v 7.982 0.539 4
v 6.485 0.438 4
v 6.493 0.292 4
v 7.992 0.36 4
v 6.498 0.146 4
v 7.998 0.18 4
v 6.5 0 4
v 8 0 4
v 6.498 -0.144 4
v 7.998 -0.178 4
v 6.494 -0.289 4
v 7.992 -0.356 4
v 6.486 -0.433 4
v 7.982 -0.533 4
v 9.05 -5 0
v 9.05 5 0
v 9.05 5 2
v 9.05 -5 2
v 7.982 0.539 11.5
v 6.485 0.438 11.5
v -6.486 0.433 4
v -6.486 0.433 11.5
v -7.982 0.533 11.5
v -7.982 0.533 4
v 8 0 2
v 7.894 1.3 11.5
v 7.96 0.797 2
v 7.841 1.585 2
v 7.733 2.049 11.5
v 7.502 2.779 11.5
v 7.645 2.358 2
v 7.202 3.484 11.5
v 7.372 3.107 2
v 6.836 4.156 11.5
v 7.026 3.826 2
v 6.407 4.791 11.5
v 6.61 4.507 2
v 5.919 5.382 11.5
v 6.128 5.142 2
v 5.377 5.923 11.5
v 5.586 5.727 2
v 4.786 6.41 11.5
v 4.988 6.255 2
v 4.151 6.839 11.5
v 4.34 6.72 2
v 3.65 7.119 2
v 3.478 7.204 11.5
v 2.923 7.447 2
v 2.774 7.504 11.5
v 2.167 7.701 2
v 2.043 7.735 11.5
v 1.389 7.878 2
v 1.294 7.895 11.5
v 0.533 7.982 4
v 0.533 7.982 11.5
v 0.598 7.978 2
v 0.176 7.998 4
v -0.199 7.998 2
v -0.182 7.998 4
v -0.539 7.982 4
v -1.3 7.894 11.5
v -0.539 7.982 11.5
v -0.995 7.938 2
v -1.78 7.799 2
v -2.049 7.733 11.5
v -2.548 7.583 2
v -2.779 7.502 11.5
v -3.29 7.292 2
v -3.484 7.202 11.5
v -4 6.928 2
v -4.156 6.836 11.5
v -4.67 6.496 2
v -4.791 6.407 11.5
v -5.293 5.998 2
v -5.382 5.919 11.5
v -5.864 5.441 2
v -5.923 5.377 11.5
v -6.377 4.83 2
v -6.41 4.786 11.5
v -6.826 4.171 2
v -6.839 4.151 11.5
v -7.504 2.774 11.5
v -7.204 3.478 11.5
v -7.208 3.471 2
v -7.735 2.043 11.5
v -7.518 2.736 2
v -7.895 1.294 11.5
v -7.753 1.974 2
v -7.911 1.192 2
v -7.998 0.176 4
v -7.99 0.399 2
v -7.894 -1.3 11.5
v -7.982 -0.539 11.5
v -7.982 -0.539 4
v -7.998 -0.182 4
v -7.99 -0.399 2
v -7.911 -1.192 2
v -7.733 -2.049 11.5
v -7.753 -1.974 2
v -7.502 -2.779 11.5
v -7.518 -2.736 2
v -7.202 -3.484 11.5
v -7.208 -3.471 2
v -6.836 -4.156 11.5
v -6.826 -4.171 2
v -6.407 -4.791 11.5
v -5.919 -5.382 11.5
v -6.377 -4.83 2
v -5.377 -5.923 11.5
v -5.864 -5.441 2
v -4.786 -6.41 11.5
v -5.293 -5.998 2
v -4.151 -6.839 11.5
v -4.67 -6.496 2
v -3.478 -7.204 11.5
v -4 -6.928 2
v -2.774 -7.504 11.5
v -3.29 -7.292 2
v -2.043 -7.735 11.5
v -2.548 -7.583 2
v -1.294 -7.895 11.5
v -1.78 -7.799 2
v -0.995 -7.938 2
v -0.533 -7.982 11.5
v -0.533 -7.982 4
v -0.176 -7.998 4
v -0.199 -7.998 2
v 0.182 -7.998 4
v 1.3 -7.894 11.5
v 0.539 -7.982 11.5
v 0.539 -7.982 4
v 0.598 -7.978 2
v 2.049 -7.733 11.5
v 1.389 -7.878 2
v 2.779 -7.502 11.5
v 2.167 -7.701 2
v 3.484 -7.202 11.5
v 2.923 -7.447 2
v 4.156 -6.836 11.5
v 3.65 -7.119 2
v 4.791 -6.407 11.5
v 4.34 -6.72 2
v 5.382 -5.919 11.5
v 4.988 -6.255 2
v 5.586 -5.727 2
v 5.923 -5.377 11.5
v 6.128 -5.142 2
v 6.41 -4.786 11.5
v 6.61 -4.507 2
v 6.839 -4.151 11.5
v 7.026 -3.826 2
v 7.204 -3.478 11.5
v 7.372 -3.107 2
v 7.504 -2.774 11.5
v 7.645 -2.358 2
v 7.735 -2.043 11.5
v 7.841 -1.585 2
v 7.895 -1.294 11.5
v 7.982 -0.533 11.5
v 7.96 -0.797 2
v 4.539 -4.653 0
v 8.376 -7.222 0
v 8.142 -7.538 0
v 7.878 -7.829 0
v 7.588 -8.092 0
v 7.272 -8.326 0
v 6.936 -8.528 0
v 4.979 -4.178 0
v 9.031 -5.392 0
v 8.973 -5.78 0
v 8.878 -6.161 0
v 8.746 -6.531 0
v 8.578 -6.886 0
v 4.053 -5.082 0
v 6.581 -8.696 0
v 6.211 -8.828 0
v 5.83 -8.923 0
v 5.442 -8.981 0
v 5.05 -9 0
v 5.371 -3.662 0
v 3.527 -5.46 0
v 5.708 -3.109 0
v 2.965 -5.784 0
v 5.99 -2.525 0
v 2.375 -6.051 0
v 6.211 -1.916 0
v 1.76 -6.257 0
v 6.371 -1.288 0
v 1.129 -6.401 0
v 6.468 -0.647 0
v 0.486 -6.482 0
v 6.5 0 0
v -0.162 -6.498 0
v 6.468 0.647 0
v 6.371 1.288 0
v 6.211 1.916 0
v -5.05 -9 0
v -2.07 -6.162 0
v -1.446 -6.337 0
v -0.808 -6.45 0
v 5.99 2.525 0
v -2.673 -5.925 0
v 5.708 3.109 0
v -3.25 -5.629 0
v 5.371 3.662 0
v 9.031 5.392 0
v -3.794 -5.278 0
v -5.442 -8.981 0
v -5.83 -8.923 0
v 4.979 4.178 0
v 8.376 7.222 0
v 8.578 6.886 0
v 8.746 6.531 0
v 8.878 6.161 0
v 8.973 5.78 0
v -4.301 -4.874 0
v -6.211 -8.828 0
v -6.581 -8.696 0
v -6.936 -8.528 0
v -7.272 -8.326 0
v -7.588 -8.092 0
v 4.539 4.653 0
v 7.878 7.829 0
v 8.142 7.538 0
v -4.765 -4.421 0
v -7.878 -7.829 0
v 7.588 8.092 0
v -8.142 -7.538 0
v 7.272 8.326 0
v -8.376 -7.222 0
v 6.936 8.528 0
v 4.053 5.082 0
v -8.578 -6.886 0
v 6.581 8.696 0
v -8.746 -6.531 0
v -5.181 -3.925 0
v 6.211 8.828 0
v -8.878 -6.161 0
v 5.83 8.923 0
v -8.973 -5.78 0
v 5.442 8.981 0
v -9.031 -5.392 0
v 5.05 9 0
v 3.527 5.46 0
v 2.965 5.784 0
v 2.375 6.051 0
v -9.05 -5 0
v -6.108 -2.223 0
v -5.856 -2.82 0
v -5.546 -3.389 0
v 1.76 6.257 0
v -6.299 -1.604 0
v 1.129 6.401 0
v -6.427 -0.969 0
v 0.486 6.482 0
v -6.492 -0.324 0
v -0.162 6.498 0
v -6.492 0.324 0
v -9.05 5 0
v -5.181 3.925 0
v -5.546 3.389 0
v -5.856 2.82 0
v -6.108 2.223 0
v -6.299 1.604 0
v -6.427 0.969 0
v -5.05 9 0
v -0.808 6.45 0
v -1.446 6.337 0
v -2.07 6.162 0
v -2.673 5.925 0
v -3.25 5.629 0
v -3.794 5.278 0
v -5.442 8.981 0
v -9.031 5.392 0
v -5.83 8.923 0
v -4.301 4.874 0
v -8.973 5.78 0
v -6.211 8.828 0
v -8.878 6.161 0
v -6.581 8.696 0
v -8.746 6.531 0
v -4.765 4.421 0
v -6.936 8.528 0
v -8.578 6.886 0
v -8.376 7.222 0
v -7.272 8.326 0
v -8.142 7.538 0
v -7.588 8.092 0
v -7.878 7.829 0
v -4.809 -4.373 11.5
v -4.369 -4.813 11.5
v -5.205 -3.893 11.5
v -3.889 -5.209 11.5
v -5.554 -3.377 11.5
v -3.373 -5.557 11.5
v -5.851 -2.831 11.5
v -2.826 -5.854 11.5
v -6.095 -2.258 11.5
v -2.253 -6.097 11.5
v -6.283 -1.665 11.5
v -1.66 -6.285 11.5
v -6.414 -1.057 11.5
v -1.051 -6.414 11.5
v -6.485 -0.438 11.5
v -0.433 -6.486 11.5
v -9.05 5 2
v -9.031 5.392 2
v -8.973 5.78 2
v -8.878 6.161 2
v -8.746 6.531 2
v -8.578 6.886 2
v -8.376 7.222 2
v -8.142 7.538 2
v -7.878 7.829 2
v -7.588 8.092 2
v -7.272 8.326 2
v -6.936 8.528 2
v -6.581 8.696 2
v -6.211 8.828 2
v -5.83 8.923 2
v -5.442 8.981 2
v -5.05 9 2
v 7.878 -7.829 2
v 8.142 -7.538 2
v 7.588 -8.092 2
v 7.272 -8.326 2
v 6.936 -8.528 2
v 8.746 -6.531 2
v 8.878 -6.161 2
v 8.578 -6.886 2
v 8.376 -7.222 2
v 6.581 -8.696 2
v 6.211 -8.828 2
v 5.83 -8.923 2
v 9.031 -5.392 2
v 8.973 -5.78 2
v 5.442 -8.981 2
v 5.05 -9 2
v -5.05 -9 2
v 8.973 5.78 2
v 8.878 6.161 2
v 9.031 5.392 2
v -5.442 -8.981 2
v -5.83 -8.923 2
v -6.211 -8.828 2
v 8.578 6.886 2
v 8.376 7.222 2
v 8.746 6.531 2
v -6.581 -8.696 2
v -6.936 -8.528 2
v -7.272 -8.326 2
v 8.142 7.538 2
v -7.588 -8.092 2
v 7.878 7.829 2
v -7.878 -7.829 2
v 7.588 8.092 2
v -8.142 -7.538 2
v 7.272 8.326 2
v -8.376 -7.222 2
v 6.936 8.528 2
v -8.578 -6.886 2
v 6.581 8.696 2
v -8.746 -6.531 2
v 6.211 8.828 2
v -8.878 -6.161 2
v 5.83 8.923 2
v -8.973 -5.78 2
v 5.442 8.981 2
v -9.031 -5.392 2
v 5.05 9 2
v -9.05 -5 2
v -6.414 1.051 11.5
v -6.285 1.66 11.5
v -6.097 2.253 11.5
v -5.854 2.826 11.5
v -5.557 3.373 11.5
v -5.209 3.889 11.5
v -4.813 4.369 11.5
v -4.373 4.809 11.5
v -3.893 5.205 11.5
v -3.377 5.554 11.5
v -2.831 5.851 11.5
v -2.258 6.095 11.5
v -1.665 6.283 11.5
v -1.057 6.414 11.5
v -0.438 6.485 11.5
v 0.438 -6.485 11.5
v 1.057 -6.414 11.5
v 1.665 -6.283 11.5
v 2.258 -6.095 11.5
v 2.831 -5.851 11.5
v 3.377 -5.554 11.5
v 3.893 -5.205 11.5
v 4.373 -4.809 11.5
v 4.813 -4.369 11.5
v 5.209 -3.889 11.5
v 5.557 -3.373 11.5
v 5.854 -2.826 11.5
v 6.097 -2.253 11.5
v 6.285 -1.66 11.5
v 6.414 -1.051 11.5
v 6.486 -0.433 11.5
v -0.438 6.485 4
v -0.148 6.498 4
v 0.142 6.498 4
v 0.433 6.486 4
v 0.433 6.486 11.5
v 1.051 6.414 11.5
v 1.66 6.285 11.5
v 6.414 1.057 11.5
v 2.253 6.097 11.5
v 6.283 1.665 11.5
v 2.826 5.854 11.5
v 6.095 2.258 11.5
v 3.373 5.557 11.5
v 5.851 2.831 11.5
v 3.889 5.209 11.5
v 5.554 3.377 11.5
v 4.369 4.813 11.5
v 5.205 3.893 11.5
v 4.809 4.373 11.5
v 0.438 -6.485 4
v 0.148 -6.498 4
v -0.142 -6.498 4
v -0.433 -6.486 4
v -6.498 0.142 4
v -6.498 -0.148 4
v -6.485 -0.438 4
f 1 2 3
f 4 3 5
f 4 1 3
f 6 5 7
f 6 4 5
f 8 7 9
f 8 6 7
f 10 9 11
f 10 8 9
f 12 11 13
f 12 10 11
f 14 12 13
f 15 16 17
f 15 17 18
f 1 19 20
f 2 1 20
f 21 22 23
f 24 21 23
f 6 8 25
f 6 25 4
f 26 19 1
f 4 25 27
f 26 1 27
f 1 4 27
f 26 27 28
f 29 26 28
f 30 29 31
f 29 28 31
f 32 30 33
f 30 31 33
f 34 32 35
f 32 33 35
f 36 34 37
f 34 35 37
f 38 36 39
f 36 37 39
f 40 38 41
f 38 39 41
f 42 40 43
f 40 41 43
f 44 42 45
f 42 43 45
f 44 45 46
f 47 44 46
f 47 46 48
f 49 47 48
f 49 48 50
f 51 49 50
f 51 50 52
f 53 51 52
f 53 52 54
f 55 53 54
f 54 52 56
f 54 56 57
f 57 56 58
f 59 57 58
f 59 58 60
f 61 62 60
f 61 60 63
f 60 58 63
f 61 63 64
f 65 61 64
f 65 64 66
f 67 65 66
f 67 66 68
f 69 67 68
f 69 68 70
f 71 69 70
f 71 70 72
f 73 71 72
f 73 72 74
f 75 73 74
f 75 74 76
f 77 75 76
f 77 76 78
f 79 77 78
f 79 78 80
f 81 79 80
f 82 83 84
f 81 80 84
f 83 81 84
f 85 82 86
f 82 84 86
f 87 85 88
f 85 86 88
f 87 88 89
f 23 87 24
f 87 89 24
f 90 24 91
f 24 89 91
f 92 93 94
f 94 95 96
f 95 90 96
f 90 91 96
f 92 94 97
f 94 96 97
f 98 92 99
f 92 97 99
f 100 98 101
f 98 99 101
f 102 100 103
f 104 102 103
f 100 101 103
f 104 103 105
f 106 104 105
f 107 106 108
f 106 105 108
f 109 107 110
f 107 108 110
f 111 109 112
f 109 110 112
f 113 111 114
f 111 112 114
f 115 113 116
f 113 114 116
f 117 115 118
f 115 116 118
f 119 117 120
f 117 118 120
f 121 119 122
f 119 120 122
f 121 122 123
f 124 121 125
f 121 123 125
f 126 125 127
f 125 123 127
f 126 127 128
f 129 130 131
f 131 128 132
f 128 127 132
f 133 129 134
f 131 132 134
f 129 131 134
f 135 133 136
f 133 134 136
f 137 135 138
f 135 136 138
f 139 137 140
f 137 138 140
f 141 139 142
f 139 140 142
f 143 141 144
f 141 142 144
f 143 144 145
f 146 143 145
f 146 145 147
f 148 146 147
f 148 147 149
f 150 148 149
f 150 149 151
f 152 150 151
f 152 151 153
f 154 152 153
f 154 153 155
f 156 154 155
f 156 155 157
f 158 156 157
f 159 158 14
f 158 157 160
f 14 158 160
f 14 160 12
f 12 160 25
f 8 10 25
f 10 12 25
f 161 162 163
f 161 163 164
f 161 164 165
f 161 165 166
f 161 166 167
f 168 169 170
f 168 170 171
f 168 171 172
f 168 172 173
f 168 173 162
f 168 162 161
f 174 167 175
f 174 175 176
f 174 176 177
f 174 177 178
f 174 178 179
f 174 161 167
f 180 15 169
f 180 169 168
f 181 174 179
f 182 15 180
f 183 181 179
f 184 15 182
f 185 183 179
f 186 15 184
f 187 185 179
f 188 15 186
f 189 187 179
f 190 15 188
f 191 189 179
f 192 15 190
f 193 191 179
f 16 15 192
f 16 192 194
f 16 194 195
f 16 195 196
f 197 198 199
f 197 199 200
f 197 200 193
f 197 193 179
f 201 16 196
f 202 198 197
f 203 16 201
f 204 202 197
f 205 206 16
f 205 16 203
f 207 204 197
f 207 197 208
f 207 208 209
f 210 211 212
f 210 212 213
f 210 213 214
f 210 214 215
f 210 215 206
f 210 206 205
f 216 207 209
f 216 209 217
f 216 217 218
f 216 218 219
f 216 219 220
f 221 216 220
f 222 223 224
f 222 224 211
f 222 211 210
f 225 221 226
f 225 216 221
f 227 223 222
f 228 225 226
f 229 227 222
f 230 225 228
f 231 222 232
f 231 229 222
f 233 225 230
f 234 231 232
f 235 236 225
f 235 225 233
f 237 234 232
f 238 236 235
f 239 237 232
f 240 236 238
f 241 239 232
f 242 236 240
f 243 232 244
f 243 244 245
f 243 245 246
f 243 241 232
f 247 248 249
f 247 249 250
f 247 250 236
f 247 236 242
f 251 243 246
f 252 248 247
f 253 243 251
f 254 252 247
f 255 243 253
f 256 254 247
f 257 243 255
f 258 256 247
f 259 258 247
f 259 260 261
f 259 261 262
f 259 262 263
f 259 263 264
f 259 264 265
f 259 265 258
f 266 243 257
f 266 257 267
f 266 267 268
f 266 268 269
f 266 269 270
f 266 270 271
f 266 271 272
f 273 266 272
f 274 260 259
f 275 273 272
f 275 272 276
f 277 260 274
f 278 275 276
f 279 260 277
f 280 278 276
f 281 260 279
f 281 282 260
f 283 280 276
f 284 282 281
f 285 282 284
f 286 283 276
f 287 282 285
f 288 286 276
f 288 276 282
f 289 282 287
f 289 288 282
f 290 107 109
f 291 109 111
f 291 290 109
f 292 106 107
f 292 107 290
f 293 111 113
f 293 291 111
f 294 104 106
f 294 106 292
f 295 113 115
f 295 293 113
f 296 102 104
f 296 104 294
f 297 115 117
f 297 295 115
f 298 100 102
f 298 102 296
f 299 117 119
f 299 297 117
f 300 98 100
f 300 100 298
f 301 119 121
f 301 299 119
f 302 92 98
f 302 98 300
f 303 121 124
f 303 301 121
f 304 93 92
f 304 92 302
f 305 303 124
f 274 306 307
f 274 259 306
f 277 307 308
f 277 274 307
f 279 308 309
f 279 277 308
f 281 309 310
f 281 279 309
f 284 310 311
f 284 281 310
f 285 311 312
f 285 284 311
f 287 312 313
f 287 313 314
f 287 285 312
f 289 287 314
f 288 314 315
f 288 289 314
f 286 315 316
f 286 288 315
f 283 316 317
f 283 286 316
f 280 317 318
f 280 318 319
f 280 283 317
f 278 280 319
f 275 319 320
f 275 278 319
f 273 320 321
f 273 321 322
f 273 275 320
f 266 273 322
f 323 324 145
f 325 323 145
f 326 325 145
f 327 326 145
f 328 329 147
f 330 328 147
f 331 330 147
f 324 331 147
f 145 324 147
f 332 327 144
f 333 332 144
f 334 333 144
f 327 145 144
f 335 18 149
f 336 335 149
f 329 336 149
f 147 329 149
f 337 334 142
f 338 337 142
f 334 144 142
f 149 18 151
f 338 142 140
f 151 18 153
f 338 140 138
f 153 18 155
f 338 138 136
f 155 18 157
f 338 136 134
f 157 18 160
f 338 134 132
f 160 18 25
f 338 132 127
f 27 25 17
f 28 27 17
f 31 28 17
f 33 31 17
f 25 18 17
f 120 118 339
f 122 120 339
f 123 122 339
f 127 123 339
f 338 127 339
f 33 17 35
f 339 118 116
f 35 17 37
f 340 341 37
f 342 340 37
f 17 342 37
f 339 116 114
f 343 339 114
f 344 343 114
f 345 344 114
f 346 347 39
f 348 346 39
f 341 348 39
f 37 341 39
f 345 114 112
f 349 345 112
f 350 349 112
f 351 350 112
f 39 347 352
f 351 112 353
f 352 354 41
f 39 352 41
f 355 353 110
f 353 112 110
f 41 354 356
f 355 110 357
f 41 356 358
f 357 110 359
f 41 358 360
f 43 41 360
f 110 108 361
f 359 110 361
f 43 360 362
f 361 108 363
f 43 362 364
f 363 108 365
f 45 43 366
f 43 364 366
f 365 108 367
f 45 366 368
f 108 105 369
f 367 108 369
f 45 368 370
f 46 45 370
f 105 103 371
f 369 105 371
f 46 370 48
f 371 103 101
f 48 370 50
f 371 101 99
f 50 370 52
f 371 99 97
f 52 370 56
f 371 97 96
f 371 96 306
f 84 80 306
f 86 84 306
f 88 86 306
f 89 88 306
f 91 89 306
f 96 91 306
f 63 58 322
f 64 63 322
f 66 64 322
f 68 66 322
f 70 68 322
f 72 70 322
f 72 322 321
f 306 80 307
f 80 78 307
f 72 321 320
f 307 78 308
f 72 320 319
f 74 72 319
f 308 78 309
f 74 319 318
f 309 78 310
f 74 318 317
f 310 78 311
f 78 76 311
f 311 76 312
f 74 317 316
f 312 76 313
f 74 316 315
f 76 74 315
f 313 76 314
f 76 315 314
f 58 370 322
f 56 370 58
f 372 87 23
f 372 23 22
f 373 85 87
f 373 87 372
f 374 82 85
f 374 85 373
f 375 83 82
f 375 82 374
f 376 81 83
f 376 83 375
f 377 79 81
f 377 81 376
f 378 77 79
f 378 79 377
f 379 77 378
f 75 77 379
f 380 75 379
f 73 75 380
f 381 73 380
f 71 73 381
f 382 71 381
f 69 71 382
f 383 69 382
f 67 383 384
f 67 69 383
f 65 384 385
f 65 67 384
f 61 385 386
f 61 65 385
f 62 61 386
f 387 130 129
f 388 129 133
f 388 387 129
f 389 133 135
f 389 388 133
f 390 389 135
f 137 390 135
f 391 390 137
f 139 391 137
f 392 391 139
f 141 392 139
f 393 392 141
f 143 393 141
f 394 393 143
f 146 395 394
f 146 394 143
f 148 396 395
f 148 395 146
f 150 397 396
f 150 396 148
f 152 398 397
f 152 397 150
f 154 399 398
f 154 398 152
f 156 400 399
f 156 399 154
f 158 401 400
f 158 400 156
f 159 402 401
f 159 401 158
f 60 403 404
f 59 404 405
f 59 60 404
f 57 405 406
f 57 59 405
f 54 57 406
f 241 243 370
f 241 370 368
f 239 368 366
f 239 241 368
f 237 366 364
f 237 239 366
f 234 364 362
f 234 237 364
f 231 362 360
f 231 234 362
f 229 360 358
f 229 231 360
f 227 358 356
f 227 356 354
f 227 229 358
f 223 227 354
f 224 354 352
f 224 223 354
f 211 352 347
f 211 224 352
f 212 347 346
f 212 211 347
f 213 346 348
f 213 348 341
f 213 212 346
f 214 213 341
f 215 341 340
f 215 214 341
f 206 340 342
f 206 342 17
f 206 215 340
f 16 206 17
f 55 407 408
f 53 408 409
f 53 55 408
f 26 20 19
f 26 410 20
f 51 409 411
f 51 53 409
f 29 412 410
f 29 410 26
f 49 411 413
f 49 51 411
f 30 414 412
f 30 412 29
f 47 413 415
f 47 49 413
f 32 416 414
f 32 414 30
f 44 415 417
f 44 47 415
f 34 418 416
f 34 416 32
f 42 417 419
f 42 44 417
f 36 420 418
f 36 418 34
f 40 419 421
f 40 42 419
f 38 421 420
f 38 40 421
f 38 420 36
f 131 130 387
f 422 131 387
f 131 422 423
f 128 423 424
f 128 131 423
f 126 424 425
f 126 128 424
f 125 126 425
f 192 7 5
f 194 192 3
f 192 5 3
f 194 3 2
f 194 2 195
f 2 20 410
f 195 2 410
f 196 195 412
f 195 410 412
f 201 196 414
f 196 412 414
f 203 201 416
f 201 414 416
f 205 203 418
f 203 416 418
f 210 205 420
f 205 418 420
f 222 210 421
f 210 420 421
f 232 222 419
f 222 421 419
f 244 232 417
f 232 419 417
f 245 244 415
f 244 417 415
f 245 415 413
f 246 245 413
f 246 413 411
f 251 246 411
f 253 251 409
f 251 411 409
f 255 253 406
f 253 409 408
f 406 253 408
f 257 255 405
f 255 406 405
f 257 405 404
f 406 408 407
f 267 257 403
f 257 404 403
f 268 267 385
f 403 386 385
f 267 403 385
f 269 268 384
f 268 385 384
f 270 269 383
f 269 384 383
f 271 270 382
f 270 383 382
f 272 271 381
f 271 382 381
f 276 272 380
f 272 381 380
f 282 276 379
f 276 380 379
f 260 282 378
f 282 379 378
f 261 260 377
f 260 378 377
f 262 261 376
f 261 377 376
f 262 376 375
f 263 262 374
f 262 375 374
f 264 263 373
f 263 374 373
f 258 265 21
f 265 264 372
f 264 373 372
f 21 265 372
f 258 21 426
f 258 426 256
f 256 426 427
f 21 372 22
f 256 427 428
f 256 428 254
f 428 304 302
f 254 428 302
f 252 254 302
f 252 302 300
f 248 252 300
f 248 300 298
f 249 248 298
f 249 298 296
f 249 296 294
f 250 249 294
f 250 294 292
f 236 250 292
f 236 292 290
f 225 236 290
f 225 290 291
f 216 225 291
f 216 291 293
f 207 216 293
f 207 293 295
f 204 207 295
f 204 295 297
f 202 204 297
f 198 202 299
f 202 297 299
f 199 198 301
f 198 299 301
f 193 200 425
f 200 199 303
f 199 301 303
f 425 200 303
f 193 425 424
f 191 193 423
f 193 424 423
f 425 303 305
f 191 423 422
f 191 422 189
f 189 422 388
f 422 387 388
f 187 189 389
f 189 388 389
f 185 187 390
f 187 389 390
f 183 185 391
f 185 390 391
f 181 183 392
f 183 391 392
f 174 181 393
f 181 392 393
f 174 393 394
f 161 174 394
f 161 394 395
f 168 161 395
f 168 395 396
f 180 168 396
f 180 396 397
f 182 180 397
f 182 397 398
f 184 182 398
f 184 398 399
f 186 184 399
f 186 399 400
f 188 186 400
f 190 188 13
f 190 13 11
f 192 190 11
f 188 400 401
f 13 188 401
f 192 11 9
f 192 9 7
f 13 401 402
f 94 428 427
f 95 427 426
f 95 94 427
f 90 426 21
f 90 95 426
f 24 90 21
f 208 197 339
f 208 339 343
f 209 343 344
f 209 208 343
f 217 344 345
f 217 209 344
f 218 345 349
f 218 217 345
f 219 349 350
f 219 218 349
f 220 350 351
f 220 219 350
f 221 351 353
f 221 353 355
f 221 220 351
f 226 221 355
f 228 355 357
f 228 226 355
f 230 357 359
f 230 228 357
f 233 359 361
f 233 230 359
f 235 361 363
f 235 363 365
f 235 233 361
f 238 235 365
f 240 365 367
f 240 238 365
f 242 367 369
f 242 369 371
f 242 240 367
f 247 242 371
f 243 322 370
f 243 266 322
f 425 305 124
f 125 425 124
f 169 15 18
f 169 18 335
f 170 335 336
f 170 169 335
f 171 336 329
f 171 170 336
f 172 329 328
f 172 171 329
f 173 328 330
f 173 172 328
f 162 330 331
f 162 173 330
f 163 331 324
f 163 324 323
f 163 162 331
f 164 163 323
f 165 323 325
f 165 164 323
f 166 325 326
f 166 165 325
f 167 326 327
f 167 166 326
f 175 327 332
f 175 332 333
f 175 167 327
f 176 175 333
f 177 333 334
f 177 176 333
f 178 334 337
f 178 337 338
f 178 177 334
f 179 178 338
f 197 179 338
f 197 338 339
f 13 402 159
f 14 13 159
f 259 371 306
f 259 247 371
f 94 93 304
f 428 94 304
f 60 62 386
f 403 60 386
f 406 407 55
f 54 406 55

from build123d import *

# Parameters (mm, degrees)
BOSS_EXTRUDE1_DEPTH = 0.0001
BOSS_EXTRUDE2_DEPTH = 2
BOSS_EXTRUDE3_DEPTH = 0.0001
SKETCH4_R           = 8
BOSS_EXTRUDE4_DEPTH = 9.5
SKETCH5_R           = 6.5
CUT_EXTRUDE1_DEPTH  = 25
CUT_EXTRUDE4_DEPTH  = 7.5
CIRPATTERN2_COUNT   = 4


with BuildPart() as part:
    # Sketch1 → Boss-Extrude1 (new body)
    with BuildSketch(Plane.XY):
        with BuildLine():
            Line((-5.05, 9.000108401), (5.05, 9.000108401))
            ThreePointArc((5.05, 9.000108401), (7.878427125, 7.828535526), (9.05, 5.000108401))
            Line((9.05, 5.000108401), (9.05, -5.000108401))
            ThreePointArc((9.05, -5.000108401), (7.878427125, -7.828535526), (5.05, -9.000108401))
            Line((5.05, -9.000108401), (-5.05, -9.000108401))
            ThreePointArc((-5.05, -9.000108401), (-7.878427125, -7.828535526), (-9.05, -5.000108401))
            Line((-9.05, -5.000108401), (-9.05, 5.000108401))
            ThreePointArc((-9.05, 5.000108401), (-7.878427125, 7.828535526), (-5.05, 9.000108401))
        make_face()
    extrude(amount=BOSS_EXTRUDE1_DEPTH)

    # Sketch2 → Boss-Extrude2 (add)
    with BuildSketch(Plane.XY):
        with BuildLine():
            Line((-5.05, 9.000108401), (5.05, 9.000108401))
            ThreePointArc((5.05, 9.000108401), (7.878427125, 7.828535526), (9.05, 5.000108401))
            Line((9.05, 5.000108401), (9.05, -5.000108401))
            ThreePointArc((9.05, -5.000108401), (7.878427125, -7.828535526), (5.05, -9.000108401))
            Line((5.05, -9.000108401), (-5.05, -9.000108401))
            ThreePointArc((-5.05, -9.000108401), (-7.878427125, -7.828535526), (-9.05, -5.000108401))
            Line((-9.05, -5.000108401), (-9.05, 5.000108401))
            ThreePointArc((-9.05, 5.000108401), (-7.878427125, 7.828535526), (-5.05, 9.000108401))
        make_face()
    extrude(amount=BOSS_EXTRUDE2_DEPTH)

    # Sketch3 → Boss-Extrude3 (add)
    with BuildSketch(Plane.XY.offset(2)):
        with BuildLine():
            Line((-5.05, 9.000108401), (5.05, 9.000108401))
            ThreePointArc((5.05, 9.000108401), (7.878427125, 7.828535526), (9.05, 5.000108401))
            Line((9.05, 5.000108401), (9.05, -5.000108401))
            ThreePointArc((9.05, -5.000108401), (7.878427125, -7.828535526), (5.05, -9.000108401))
            Line((5.05, -9.000108401), (-5.05, -9.000108401))
            ThreePointArc((-5.05, -9.000108401), (-7.878427125, -7.828535526), (-9.05, -5.000108401))
            Line((-9.05, -5.000108401), (-9.05, 5.000108401))
            ThreePointArc((-9.05, 5.000108401), (-7.878427125, 7.828535526), (-5.05, 9.000108401))
        make_face()
    extrude(amount=BOSS_EXTRUDE3_DEPTH)

    # Sketch4 → Boss-Extrude4 (add)
    with BuildSketch(Plane.XY.offset(2.0001)):
        Circle(SKETCH4_R)
    extrude(amount=BOSS_EXTRUDE4_DEPTH)

    # Sketch5 → Cut-Extrude1 (cut, symmetric)
    with BuildSketch(Plane.XY.offset(2.0001)):
        Circle(SKETCH5_R)
    extrude(amount=CUT_EXTRUDE1_DEPTH, both=True, mode=Mode.SUBTRACT)

    # Sketch15 → Cut-Extrude4 (cut)
    with BuildSketch(Plane.XY.offset(11.5001)):
        Polygon((-0.552830798, 8.187091014), (-0.002830798, 0.003314653), (0.547169202, 8.187091014), (0.617169202, 9.000108401), (-0.626042329, 9.000108401), align=None)
    cut_extrude4 = extrude(amount=-CUT_EXTRUDE4_DEPTH, mode=Mode.SUBTRACT)

    # CirPattern2: Cut-Extrude4 ×4 about axis
    cirpattern2_axis = Axis((0, 0, 0), (0, 0, 1))
    for i in range(1, CIRPATTERN2_COUNT):
        add(cut_extrude4.rotate(cirpattern2_axis, i * 360 / CIRPATTERN2_COUNT), mode=Mode.SUBTRACT)


solid = part.part
